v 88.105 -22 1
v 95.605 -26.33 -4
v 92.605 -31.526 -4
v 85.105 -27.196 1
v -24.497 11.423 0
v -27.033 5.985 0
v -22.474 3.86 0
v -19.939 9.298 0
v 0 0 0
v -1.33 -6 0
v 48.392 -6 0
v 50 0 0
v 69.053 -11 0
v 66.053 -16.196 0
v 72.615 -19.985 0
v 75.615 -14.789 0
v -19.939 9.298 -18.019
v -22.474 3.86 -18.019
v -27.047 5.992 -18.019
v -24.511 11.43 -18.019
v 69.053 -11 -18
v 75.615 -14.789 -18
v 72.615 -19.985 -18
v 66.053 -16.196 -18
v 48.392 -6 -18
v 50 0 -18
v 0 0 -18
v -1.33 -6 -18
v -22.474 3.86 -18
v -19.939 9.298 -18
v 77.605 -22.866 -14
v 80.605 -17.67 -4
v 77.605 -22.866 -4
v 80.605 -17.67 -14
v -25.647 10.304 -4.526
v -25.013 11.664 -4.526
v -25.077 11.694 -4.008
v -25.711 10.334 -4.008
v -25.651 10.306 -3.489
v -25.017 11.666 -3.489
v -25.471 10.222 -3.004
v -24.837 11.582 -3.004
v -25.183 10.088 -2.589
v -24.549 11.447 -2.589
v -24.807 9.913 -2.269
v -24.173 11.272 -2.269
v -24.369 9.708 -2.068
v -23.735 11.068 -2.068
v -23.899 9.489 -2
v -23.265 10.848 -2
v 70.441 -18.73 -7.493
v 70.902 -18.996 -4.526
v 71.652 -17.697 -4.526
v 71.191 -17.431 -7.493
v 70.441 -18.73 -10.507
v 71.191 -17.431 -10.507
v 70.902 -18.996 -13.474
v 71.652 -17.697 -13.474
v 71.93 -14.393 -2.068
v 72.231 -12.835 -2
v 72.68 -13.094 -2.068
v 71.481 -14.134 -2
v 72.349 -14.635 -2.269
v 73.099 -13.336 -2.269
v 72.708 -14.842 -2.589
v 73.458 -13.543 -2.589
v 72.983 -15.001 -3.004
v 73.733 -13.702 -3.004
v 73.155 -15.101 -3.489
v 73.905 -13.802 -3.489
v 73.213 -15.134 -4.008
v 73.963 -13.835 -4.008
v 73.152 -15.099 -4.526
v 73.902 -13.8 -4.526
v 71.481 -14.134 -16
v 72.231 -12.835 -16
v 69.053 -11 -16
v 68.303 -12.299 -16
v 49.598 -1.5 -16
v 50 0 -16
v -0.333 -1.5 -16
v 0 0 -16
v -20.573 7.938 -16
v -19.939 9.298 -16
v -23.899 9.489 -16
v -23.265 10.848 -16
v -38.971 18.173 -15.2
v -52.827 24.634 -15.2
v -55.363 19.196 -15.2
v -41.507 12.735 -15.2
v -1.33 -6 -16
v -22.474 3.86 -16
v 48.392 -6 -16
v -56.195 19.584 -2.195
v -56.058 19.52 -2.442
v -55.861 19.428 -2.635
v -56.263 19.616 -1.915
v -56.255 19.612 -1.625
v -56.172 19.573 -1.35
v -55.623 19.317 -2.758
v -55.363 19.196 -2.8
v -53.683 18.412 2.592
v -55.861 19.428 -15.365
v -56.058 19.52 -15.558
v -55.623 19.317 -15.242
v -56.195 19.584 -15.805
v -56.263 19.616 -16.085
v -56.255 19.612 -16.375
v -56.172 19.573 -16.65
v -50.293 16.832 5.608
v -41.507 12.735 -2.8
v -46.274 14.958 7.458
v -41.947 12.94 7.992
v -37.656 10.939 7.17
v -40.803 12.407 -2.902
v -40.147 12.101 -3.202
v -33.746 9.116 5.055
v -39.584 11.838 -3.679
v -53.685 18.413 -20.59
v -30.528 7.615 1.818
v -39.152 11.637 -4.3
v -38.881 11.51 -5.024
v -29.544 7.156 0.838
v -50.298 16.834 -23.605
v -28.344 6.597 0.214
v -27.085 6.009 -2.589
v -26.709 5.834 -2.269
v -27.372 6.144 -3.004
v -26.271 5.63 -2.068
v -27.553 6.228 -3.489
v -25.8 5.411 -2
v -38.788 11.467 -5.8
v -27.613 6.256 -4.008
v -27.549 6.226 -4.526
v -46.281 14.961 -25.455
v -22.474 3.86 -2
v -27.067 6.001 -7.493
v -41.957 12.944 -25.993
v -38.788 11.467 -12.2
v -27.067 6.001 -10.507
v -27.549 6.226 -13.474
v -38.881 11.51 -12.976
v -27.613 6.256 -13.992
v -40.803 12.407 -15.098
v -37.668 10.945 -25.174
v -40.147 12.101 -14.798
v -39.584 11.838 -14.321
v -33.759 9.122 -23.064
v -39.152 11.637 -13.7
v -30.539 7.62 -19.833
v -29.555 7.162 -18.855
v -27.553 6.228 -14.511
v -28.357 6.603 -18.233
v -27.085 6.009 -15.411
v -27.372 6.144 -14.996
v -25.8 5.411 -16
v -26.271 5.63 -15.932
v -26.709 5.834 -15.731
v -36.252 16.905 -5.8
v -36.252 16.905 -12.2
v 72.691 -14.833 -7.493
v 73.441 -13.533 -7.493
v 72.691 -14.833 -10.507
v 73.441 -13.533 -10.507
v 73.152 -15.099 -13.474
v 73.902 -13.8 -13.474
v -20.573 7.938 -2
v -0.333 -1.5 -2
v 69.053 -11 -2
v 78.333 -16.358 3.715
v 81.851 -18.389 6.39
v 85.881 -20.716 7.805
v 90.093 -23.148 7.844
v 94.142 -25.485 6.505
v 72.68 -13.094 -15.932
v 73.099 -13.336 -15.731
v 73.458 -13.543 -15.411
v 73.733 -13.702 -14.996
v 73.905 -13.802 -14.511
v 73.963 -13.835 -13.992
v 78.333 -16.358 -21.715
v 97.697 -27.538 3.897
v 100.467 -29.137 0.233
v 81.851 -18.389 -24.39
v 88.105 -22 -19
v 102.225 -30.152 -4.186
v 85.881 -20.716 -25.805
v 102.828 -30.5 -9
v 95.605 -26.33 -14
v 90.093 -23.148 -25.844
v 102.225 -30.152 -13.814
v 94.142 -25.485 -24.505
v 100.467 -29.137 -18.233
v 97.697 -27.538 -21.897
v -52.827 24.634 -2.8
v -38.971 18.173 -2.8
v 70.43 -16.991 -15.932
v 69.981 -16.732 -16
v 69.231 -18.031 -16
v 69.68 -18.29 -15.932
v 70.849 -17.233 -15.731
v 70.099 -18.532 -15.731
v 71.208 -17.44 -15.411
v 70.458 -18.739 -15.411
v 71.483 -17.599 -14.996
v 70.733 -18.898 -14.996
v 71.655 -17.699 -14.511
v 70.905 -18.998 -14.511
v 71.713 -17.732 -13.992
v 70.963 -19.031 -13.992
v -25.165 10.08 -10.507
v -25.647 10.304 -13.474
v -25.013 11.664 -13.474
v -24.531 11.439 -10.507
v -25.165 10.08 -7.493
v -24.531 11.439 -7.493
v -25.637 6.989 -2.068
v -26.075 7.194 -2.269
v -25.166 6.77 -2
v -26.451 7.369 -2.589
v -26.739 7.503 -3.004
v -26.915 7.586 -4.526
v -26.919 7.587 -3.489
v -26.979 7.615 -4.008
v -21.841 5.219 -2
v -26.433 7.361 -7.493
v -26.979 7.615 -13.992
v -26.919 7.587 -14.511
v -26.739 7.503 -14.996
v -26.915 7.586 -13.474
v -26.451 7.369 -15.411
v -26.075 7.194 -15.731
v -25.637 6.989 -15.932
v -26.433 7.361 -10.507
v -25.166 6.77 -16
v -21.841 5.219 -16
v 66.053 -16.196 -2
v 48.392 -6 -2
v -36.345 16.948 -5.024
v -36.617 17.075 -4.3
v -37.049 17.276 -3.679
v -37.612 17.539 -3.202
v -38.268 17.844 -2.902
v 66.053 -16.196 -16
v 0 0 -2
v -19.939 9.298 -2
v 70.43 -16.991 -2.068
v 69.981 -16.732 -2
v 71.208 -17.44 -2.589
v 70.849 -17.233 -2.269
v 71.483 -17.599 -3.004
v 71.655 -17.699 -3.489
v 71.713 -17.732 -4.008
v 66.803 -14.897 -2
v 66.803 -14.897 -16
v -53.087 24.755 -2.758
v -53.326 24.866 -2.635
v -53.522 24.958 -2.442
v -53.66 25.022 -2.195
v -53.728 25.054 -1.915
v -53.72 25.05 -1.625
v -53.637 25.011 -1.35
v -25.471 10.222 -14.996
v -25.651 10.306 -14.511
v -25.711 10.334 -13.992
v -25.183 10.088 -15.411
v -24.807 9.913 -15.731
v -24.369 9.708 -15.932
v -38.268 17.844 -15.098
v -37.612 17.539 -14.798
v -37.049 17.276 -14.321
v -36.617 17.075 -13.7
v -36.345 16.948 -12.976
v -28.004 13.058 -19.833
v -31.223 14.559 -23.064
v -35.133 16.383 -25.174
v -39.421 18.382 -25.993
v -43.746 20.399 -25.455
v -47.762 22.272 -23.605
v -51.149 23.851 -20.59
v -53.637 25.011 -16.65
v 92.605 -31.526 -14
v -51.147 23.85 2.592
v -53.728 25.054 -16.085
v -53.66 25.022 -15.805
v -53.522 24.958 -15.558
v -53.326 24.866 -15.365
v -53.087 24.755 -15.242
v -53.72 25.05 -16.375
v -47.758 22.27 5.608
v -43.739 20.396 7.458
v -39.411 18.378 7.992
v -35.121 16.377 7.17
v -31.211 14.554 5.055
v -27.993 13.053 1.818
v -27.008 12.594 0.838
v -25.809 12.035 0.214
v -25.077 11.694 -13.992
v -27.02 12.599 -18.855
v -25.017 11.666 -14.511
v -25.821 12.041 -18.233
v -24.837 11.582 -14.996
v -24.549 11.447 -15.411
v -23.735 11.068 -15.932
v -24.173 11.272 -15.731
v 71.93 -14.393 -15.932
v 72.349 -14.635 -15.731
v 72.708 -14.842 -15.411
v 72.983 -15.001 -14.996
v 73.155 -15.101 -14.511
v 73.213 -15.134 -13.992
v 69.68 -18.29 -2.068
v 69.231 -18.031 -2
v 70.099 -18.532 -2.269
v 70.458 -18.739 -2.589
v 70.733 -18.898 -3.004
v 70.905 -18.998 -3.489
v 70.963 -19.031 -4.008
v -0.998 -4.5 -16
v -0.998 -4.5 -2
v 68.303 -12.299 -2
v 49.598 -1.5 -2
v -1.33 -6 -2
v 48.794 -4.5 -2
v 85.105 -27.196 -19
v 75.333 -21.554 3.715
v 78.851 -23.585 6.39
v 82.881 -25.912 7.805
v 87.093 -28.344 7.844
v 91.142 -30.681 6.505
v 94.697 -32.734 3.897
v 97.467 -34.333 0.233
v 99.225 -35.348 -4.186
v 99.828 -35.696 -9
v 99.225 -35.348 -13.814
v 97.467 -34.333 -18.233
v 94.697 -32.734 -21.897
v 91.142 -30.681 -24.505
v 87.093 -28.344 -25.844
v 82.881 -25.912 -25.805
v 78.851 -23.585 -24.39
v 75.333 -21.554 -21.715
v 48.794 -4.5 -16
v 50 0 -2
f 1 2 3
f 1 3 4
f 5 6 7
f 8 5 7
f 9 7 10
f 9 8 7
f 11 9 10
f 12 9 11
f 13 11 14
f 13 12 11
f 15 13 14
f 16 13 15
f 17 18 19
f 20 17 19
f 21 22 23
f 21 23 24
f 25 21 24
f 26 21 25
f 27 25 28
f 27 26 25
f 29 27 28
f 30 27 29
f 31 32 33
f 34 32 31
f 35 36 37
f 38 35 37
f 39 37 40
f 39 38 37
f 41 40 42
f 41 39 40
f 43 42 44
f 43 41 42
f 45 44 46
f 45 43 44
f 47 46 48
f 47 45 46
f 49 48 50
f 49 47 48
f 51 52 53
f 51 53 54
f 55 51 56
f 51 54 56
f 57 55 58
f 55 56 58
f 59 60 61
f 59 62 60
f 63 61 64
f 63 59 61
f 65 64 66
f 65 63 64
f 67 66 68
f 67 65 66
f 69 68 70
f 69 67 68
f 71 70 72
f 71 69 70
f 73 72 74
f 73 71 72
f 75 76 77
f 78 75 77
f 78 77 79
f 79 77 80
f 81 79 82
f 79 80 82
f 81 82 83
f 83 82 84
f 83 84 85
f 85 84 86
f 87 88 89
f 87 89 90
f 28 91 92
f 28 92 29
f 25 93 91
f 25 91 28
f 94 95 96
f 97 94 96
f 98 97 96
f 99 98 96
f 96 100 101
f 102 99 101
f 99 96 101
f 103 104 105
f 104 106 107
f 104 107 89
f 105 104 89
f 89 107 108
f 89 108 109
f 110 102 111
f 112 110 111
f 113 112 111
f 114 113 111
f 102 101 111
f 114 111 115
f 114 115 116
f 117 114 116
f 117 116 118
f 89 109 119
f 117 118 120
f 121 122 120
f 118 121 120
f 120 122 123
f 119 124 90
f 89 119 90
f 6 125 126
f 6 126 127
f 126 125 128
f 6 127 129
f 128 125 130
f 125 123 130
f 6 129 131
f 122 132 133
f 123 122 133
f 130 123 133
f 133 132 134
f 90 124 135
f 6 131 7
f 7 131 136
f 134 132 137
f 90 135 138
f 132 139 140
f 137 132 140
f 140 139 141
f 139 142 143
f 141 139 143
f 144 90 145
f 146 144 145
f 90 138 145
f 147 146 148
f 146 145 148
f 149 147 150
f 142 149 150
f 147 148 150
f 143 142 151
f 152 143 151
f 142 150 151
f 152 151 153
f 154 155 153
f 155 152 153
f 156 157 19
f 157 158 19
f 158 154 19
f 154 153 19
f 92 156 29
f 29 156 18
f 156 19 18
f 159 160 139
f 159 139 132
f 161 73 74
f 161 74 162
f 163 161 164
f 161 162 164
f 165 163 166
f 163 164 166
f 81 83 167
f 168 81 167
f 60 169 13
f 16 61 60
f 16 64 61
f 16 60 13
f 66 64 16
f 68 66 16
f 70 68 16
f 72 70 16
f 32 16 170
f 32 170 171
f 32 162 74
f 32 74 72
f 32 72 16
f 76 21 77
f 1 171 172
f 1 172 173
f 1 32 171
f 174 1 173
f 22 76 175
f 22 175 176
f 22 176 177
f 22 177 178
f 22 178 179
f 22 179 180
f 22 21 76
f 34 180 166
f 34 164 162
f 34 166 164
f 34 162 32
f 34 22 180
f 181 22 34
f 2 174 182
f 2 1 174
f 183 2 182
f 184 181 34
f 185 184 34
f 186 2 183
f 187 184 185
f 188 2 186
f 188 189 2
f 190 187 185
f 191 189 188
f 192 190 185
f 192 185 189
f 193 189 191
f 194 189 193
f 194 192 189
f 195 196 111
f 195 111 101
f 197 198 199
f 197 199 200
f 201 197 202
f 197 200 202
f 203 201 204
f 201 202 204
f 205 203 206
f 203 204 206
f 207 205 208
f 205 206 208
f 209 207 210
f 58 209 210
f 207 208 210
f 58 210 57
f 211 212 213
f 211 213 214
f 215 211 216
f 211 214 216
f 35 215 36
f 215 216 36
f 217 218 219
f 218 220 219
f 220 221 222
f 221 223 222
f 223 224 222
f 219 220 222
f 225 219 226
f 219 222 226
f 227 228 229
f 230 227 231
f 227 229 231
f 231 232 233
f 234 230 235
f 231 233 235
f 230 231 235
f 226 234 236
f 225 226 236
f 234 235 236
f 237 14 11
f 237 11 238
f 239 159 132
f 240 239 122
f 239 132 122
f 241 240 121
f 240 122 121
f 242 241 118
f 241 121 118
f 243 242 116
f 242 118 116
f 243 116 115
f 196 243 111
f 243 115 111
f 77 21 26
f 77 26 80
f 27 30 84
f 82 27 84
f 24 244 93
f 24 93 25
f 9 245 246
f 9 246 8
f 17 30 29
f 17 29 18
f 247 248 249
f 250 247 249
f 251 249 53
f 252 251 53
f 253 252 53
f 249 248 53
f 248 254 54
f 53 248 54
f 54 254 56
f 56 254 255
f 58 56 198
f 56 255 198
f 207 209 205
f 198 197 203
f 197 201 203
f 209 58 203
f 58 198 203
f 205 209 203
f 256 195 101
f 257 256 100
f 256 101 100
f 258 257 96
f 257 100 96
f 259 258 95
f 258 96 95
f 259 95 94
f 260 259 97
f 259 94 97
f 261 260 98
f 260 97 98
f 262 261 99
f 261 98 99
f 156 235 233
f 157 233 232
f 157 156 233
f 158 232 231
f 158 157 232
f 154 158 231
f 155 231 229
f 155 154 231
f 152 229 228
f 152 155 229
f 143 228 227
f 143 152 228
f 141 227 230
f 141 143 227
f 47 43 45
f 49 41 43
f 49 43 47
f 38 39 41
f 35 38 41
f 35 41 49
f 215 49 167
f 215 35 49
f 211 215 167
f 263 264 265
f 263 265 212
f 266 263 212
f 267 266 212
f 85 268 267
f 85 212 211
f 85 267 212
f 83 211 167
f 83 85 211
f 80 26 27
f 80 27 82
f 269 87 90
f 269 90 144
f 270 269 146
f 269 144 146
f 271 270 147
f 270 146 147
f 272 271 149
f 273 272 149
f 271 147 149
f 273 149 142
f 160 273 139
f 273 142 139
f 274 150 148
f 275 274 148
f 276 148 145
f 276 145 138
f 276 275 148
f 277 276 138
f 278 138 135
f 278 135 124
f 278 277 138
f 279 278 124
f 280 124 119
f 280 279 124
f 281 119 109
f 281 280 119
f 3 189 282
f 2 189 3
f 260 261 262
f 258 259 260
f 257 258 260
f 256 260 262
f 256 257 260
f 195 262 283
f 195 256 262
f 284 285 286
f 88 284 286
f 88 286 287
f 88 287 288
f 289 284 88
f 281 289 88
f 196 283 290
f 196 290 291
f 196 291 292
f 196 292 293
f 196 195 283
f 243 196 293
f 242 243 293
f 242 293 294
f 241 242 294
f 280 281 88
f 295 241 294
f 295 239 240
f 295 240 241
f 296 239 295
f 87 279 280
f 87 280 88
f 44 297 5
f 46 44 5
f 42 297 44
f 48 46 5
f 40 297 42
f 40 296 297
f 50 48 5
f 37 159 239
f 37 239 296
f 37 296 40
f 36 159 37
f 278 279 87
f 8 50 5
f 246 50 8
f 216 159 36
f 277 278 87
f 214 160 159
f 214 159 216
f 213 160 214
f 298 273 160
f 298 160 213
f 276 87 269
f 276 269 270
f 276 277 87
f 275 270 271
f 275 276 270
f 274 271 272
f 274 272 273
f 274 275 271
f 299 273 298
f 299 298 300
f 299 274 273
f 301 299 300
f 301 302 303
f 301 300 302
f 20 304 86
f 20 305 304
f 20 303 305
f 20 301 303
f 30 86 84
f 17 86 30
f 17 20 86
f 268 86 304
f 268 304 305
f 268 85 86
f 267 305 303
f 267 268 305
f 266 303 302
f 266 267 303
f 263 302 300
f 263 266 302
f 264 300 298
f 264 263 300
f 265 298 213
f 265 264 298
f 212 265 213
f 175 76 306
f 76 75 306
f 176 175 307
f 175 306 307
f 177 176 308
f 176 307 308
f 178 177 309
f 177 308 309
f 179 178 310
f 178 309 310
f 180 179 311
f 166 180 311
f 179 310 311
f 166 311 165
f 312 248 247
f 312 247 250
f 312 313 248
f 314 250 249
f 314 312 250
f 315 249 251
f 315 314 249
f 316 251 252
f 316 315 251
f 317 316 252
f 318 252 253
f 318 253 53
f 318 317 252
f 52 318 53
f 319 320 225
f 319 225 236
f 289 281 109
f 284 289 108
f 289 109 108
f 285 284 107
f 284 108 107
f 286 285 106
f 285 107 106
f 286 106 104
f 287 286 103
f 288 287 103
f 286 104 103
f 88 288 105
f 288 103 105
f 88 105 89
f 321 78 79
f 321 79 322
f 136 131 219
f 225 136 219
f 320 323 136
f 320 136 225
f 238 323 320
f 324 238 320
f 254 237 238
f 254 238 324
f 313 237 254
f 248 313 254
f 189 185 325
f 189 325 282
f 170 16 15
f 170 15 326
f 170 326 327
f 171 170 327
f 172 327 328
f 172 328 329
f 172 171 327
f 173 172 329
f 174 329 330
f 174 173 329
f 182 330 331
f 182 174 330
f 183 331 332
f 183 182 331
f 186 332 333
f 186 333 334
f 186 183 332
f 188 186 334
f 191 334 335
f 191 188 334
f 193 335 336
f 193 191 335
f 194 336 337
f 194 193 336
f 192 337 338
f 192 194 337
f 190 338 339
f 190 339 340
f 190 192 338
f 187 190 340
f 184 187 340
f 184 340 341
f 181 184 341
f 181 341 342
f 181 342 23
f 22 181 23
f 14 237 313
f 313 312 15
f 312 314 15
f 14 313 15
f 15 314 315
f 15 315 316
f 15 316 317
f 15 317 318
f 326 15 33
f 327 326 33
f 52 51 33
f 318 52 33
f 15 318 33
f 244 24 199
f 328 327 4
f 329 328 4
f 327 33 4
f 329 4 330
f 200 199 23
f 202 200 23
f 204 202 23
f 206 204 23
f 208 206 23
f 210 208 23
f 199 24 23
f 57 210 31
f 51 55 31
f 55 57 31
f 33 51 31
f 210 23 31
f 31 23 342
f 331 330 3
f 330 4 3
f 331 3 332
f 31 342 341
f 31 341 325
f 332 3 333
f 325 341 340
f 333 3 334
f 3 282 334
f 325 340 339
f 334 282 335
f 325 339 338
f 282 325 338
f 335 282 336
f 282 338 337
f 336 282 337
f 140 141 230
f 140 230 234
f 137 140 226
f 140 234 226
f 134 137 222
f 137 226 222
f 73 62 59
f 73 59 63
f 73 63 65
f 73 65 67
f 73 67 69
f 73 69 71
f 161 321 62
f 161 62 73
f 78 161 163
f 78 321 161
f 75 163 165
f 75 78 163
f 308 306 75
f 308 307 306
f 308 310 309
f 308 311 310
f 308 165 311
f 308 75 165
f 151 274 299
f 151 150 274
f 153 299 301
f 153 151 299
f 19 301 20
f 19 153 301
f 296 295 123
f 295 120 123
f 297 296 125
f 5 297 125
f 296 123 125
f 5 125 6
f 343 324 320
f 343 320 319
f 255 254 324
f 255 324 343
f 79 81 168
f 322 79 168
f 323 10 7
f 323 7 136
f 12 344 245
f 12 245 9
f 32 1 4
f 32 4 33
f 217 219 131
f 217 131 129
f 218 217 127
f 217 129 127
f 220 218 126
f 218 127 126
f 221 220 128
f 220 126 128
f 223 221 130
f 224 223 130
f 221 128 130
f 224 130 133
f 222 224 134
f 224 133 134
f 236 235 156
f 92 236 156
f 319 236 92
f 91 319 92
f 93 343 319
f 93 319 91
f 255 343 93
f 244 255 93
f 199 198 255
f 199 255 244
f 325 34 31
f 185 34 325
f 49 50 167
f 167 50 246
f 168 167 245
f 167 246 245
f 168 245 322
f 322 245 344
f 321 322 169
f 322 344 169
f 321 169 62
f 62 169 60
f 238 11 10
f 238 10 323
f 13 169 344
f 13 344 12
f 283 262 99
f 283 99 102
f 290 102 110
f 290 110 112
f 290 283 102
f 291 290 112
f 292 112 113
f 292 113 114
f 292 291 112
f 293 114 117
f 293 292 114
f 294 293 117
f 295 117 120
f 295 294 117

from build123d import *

# Parameters (mm, degrees)
EXTRUDE_START       = 1.5
EXTRUDE_1_DEPTH     = 6
FILLET_1_R          = 1
FILLET_2_R          = 5
FILLET_3_R          = 3
CUT_EXTRUDE_1_DEPTH = 1.5
FILLET_4_R          = 2
CUT_EXTRUDE_START   = -4.5
CUT_EXTRUDE_2_DEPTH = 1.5
FILLET_5_R          = 2
EXTRUDE_2_DEPTH     = 6
CUT_EXTRUDE_3_DEPTH = 1.5
FILLET_6_R          = 2
CUT_EXTRUDE_4_DEPTH = 1.5
FILLET_7_R          = 2


with BuildPart() as part:
    # 扫描2: sweep along a path in 草图1
    with BuildLine(Plane.XY) as sweep_2_path:
        Line((-19.938771315, 9.297601758), (0, 0))
        Line((0, 0), (50, 0))
        Line((50, 0), (69.052558883, -11))
    # 草图2 → 扫描2 (sweep)
    with BuildSketch(Plane(origin=(0, 0, 0), x_dir=(0, 0, -1), z_dir=(1, 0, 0))):
        Polygon((0, 0), (2, 0), (2, -1.5), (16, -1.5), (16, 0), (18, 0), (18, -6), (16, -6), (16, -4.5), (2, -4.5), (2, -6), (0, -6), align=None)
    sweep(path=sweep_2_path.line, transition=Transition.RIGHT)

    # 草图3 → 凸台-拉伸1 (add)
    with BuildSketch(Plane(origin=(-0.633927393, -1.359461681, 0), x_dir=(0.9063077870366528, -0.42261826174069356, 0), z_dir=(0.42261826174069356, 0.9063077870366528, 0)).offset(EXTRUDE_START)):
        with BuildLine():
            Line((-22, 9), (-22, 18.019216451))
            Line((-22, 18.019216451), (-29.589804491, 18.019216451))
            ThreePointArc((-29.589804491, 18.019216451), (-45.578071203, 25.926597156), (-59.82908715, 15.2))
            Line((-59.82908715, 15.2), (-40, 15.2))
            Line((-40, 15.2), (-40, 9))
            Line((-40, 9), (-40, 2.8))
            Line((-40, 2.8), (-59.82908715, 2.8))
            ThreePointArc((-59.82908715, 2.8), (-45.56678948, -7.927645162), (-29.577794898, 0))
            Line((-29.577794898, 0), (-22, 0))
            Line((-22, 0), (-22, 9))
        make_face()
    extrude(amount=-EXTRUDE_1_DEPTH)

    # 圆角1
    fillet_1_edges = [part.edges().sort_by_distance(p)[0] for p in [
        (-55.49142236, 22.565941452, -2.8),
        (-55.49142236, 22.565941452, -15.2),
    ]]
    fillet(fillet_1_edges, radius=FILLET_1_R)

    # 圆角2
    fillet_2_edges = [part.edges().sort_by_distance(p)[0] for p in [
        (-28.085325012, 9.786268378, -18.019216451),
        (-28.074440625, 9.781192905, 0),
    ]]
    fillet(fillet_2_edges, radius=FILLET_2_R)

    # 圆角3
    fillet_3_edges = [part.edges().sort_by_distance(p)[0] for p in [
        (-37.520166267, 14.185807109, -2.8),
        (-37.520166267, 14.185807109, -15.2),
    ]]
    fillet(fillet_3_edges, radius=FILLET_3_R)

    # 草图4 → 切除-拉伸1 (cut)
    with BuildSketch(Plane(origin=(0, 0, 0), x_dir=(0.9063077870366528, -0.42261826174069356, 0), z_dir=(0.42261826174069356, 0.9063077870366528, 0))):
        with BuildLine():
            Line((-22, 16), (-28.508066615, 16))
            ThreePointArc((-28.508066615, 16), (-27, 9), (-28.508066615, 2))
            Line((-28.508066615, 2), (-22, 2))
            Line((-22, 2), (-22, 16))
        make_face()
    extrude(amount=-CUT_EXTRUDE_1_DEPTH, mode=Mode.SUBTRACT)

    # 圆角4
    fillet_4_edges = [part.edges().sort_by_distance(p)[0] for p in [
        (-26.154046463, 11.368298718, -2),
        (-26.154046463, 11.368298718, -16),
    ]]
    fillet(fillet_4_edges, radius=FILLET_4_R)

    # 草图4<2> → 切除-拉伸2 (cut)
    with BuildSketch(Plane(origin=(0, 0, 0), x_dir=(0.9063077870366528, -0.42261826174069356, 0), z_dir=(0.42261826174069356, 0.9063077870366528, 0)).offset(CUT_EXTRUDE_START)):
        with BuildLine():
            Line((-22, 16), (-28.508066615, 16))
            ThreePointArc((-28.508066615, 16), (-27, 9), (-28.508066615, 2))
            Line((-28.508066615, 2), (-22, 2))
            Line((-22, 2), (-22, 16))
        make_face()
    extrude(amount=-CUT_EXTRUDE_2_DEPTH, mode=Mode.SUBTRACT)

    # 圆角5
    fillet_5_edges = [part.edges().sort_by_distance(p)[0] for p in [
        (-28.055828641, 7.289913677, -16),
        (-28.055828641, 7.289913677, -2),
    ]]
    fillet(fillet_5_edges, radius=FILLET_5_R)

    # 草图7 → 凸台-拉伸2 (add)
    with BuildSketch(Plane(origin=(12.5, 21.650635095, 0), x_dir=(0.866025403784438, -0.5000000000000012, 0), z_dir=(0.5000000000000011, 0.8660254037844379, 0))):
        with BuildLine():
            Line((72.879065087, 18), (65.301270189, 18))
            Line((65.301270189, 18), (65.301270189, 16))
            Line((65.301270189, 16), (65.301270189, 0))
            Line((65.301270189, 0), (72.879065087, 0))
            ThreePointArc((72.879065087, 0), (104.301270189, 9), (72.879065087, 18))
        make_face()
        Polygon((78.641016151, 14), (87.301270189, 19), (95.961524227, 14), (95.961524227, 4), (87.301270189, -1), (78.641016151, 4), align=None, mode=Mode.SUBTRACT)
    extrude(amount=-EXTRUDE_2_DEPTH)

    # 草图8 → 切除-拉伸3 (cut)
    with BuildSketch(Plane(origin=(12.5, 21.650635095, 0), x_dir=(0.866025403784438, -0.5000000000000012, 0), z_dir=(0.5000000000000011, 0.8660254037844379, 0))):
        with BuildLine():
            Line((65.301270189, 16), (65.301270189, 2))
            Line((65.301270189, 2), (71.809336804, 2))
            ThreePointArc((71.809336804, 2), (70.301270189, 9), (71.809336804, 16))
            Line((71.809336804, 16), (65.301270189, 16))
        make_face()
    extrude(amount=-CUT_EXTRUDE_3_DEPTH, mode=Mode.SUBTRACT)

    # 圆角6
    fillet_6_edges = [part.edges().sort_by_distance(p)[0] for p in [
        (74.313709902, -14.90355236, -16),
        (74.313709902, -14.90355236, -2),
    ]]
    fillet(fillet_6_edges, radius=FILLET_6_R)

    # 草图8<2> → 切除-拉伸4 (cut)
    with BuildSketch(Plane(origin=(12.5, 21.650635095, 0), x_dir=(0.866025403784438, -0.5000000000000012, 0), z_dir=(0.5000000000000011, 0.8660254037844379, 0)).offset(CUT_EXTRUDE_START)):
        with BuildLine():
            Line((65.301270189, 16), (65.301270189, 2))
            Line((65.301270189, 2), (71.809336804, 2))
            ThreePointArc((71.809336804, 2), (70.301270189, 9), (71.809336804, 16))
            Line((71.809336804, 16), (65.301270189, 16))
        make_face()
    extrude(amount=-CUT_EXTRUDE_4_DEPTH, mode=Mode.SUBTRACT)

    # 圆角7
    fillet_7_edges = [part.edges().sort_by_distance(p)[0] for p in [
        (72.063709902, -18.800666677, -16),
        (72.063709902, -18.800666677, -2),
    ]]
    fillet(fillet_7_edges, radius=FILLET_7_R)


solid = part.part
